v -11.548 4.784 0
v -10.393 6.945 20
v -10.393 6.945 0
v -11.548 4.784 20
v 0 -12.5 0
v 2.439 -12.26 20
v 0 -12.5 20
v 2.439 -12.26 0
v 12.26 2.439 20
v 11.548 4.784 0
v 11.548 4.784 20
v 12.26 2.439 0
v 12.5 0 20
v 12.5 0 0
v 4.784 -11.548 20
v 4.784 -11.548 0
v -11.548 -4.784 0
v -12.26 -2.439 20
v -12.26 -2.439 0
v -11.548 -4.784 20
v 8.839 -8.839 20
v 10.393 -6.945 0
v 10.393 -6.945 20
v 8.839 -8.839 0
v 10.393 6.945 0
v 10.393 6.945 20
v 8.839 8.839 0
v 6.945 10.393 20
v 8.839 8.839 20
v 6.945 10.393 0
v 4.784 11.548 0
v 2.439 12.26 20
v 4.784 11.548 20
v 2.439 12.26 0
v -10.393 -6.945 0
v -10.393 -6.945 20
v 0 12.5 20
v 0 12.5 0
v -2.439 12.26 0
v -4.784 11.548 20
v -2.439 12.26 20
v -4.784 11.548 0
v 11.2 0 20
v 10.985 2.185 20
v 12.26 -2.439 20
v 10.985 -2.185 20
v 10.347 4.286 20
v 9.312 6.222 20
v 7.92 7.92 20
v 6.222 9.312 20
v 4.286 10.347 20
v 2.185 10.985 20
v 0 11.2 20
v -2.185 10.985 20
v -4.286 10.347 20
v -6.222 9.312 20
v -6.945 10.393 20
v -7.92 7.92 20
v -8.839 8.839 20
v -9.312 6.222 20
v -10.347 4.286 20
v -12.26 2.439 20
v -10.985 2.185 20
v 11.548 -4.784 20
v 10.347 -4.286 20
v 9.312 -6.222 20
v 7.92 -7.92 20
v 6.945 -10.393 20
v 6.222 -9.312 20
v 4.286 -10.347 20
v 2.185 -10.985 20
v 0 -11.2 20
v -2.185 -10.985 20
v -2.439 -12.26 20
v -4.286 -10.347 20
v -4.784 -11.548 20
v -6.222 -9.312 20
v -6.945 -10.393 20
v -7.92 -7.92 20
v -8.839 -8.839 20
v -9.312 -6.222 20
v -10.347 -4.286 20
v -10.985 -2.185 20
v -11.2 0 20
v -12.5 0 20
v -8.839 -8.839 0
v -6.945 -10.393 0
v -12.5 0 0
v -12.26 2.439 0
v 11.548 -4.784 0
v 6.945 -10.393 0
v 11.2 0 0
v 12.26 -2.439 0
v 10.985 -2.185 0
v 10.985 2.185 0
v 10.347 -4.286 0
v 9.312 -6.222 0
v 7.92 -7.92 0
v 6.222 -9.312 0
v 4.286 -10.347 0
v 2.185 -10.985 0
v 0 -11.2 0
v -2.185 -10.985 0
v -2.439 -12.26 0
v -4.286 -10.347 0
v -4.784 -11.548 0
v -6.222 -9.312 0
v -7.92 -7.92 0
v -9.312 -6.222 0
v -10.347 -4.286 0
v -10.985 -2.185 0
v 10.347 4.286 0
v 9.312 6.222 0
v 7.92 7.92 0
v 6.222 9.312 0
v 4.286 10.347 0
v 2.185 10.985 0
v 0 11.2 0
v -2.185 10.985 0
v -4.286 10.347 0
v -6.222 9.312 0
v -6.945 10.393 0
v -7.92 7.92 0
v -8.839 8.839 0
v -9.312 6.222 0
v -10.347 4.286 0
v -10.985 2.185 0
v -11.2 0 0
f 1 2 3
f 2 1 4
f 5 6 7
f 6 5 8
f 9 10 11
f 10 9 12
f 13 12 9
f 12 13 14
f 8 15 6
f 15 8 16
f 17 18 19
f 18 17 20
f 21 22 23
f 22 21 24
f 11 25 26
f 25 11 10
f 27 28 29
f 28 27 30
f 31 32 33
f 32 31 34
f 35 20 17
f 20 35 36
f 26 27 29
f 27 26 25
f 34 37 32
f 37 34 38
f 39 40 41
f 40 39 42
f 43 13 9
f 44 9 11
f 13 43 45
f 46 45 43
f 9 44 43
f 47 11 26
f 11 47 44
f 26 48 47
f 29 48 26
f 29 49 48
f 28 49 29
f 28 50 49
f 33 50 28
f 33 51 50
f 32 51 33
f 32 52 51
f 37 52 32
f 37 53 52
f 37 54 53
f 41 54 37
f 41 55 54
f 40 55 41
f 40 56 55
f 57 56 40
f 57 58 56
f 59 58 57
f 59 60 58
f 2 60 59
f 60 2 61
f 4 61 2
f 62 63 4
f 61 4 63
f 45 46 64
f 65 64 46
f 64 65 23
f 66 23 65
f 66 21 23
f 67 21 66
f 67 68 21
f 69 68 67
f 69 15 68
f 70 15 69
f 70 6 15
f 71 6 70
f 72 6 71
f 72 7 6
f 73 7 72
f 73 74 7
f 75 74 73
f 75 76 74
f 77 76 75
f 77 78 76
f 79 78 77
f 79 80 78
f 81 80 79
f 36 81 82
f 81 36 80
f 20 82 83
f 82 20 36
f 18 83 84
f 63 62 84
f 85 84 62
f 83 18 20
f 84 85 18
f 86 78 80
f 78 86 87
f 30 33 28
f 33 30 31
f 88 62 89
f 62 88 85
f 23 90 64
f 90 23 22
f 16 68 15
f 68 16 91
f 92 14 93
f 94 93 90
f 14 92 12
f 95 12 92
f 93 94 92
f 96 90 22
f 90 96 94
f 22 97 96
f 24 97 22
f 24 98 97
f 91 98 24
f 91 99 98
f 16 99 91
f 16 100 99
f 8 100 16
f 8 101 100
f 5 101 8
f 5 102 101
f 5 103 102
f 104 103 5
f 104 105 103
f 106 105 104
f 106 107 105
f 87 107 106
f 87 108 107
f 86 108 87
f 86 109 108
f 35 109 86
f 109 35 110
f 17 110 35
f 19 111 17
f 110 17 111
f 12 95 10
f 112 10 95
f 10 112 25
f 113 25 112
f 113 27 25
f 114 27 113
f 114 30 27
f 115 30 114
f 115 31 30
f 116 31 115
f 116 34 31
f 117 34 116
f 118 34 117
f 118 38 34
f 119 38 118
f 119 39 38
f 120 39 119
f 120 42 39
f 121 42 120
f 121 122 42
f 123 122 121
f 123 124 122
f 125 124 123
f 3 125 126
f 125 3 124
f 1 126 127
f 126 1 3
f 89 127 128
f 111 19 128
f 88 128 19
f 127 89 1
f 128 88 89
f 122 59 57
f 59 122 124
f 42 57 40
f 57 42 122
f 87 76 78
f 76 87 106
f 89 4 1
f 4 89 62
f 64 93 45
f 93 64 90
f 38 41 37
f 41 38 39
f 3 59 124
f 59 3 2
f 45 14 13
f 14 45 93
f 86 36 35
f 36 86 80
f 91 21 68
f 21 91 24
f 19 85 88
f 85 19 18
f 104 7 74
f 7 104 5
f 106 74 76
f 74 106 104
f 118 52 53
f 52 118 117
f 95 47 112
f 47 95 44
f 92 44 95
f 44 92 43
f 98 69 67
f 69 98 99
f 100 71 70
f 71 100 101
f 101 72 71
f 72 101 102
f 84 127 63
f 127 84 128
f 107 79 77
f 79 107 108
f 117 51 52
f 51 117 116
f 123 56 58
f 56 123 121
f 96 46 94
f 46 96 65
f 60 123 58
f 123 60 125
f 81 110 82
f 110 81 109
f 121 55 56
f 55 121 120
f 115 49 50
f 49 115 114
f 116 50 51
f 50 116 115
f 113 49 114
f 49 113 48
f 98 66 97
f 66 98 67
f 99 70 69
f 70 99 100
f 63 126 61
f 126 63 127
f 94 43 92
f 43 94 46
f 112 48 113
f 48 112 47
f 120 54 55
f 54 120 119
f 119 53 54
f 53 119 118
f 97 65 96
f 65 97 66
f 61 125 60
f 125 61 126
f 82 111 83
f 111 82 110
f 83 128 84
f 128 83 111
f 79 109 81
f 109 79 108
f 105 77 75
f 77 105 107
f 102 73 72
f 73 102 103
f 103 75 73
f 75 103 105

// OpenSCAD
$fn = 32;

// ----------------------------------------------------------------------
// Thin tube: 1.3 mm wall
// ----------------------------------------------------------------------

// --- parameters (mm) ---
tube_od = 25;             // outer diameter
tube_h = 20;              // height, Z
wall = 1.3;               // wall thickness

difference() {
  cylinder(h = tube_h, d = tube_od);
  translate([0, 0, -1]) cylinder(h = tube_h + 2, d = tube_od - 2 * wall);
}
